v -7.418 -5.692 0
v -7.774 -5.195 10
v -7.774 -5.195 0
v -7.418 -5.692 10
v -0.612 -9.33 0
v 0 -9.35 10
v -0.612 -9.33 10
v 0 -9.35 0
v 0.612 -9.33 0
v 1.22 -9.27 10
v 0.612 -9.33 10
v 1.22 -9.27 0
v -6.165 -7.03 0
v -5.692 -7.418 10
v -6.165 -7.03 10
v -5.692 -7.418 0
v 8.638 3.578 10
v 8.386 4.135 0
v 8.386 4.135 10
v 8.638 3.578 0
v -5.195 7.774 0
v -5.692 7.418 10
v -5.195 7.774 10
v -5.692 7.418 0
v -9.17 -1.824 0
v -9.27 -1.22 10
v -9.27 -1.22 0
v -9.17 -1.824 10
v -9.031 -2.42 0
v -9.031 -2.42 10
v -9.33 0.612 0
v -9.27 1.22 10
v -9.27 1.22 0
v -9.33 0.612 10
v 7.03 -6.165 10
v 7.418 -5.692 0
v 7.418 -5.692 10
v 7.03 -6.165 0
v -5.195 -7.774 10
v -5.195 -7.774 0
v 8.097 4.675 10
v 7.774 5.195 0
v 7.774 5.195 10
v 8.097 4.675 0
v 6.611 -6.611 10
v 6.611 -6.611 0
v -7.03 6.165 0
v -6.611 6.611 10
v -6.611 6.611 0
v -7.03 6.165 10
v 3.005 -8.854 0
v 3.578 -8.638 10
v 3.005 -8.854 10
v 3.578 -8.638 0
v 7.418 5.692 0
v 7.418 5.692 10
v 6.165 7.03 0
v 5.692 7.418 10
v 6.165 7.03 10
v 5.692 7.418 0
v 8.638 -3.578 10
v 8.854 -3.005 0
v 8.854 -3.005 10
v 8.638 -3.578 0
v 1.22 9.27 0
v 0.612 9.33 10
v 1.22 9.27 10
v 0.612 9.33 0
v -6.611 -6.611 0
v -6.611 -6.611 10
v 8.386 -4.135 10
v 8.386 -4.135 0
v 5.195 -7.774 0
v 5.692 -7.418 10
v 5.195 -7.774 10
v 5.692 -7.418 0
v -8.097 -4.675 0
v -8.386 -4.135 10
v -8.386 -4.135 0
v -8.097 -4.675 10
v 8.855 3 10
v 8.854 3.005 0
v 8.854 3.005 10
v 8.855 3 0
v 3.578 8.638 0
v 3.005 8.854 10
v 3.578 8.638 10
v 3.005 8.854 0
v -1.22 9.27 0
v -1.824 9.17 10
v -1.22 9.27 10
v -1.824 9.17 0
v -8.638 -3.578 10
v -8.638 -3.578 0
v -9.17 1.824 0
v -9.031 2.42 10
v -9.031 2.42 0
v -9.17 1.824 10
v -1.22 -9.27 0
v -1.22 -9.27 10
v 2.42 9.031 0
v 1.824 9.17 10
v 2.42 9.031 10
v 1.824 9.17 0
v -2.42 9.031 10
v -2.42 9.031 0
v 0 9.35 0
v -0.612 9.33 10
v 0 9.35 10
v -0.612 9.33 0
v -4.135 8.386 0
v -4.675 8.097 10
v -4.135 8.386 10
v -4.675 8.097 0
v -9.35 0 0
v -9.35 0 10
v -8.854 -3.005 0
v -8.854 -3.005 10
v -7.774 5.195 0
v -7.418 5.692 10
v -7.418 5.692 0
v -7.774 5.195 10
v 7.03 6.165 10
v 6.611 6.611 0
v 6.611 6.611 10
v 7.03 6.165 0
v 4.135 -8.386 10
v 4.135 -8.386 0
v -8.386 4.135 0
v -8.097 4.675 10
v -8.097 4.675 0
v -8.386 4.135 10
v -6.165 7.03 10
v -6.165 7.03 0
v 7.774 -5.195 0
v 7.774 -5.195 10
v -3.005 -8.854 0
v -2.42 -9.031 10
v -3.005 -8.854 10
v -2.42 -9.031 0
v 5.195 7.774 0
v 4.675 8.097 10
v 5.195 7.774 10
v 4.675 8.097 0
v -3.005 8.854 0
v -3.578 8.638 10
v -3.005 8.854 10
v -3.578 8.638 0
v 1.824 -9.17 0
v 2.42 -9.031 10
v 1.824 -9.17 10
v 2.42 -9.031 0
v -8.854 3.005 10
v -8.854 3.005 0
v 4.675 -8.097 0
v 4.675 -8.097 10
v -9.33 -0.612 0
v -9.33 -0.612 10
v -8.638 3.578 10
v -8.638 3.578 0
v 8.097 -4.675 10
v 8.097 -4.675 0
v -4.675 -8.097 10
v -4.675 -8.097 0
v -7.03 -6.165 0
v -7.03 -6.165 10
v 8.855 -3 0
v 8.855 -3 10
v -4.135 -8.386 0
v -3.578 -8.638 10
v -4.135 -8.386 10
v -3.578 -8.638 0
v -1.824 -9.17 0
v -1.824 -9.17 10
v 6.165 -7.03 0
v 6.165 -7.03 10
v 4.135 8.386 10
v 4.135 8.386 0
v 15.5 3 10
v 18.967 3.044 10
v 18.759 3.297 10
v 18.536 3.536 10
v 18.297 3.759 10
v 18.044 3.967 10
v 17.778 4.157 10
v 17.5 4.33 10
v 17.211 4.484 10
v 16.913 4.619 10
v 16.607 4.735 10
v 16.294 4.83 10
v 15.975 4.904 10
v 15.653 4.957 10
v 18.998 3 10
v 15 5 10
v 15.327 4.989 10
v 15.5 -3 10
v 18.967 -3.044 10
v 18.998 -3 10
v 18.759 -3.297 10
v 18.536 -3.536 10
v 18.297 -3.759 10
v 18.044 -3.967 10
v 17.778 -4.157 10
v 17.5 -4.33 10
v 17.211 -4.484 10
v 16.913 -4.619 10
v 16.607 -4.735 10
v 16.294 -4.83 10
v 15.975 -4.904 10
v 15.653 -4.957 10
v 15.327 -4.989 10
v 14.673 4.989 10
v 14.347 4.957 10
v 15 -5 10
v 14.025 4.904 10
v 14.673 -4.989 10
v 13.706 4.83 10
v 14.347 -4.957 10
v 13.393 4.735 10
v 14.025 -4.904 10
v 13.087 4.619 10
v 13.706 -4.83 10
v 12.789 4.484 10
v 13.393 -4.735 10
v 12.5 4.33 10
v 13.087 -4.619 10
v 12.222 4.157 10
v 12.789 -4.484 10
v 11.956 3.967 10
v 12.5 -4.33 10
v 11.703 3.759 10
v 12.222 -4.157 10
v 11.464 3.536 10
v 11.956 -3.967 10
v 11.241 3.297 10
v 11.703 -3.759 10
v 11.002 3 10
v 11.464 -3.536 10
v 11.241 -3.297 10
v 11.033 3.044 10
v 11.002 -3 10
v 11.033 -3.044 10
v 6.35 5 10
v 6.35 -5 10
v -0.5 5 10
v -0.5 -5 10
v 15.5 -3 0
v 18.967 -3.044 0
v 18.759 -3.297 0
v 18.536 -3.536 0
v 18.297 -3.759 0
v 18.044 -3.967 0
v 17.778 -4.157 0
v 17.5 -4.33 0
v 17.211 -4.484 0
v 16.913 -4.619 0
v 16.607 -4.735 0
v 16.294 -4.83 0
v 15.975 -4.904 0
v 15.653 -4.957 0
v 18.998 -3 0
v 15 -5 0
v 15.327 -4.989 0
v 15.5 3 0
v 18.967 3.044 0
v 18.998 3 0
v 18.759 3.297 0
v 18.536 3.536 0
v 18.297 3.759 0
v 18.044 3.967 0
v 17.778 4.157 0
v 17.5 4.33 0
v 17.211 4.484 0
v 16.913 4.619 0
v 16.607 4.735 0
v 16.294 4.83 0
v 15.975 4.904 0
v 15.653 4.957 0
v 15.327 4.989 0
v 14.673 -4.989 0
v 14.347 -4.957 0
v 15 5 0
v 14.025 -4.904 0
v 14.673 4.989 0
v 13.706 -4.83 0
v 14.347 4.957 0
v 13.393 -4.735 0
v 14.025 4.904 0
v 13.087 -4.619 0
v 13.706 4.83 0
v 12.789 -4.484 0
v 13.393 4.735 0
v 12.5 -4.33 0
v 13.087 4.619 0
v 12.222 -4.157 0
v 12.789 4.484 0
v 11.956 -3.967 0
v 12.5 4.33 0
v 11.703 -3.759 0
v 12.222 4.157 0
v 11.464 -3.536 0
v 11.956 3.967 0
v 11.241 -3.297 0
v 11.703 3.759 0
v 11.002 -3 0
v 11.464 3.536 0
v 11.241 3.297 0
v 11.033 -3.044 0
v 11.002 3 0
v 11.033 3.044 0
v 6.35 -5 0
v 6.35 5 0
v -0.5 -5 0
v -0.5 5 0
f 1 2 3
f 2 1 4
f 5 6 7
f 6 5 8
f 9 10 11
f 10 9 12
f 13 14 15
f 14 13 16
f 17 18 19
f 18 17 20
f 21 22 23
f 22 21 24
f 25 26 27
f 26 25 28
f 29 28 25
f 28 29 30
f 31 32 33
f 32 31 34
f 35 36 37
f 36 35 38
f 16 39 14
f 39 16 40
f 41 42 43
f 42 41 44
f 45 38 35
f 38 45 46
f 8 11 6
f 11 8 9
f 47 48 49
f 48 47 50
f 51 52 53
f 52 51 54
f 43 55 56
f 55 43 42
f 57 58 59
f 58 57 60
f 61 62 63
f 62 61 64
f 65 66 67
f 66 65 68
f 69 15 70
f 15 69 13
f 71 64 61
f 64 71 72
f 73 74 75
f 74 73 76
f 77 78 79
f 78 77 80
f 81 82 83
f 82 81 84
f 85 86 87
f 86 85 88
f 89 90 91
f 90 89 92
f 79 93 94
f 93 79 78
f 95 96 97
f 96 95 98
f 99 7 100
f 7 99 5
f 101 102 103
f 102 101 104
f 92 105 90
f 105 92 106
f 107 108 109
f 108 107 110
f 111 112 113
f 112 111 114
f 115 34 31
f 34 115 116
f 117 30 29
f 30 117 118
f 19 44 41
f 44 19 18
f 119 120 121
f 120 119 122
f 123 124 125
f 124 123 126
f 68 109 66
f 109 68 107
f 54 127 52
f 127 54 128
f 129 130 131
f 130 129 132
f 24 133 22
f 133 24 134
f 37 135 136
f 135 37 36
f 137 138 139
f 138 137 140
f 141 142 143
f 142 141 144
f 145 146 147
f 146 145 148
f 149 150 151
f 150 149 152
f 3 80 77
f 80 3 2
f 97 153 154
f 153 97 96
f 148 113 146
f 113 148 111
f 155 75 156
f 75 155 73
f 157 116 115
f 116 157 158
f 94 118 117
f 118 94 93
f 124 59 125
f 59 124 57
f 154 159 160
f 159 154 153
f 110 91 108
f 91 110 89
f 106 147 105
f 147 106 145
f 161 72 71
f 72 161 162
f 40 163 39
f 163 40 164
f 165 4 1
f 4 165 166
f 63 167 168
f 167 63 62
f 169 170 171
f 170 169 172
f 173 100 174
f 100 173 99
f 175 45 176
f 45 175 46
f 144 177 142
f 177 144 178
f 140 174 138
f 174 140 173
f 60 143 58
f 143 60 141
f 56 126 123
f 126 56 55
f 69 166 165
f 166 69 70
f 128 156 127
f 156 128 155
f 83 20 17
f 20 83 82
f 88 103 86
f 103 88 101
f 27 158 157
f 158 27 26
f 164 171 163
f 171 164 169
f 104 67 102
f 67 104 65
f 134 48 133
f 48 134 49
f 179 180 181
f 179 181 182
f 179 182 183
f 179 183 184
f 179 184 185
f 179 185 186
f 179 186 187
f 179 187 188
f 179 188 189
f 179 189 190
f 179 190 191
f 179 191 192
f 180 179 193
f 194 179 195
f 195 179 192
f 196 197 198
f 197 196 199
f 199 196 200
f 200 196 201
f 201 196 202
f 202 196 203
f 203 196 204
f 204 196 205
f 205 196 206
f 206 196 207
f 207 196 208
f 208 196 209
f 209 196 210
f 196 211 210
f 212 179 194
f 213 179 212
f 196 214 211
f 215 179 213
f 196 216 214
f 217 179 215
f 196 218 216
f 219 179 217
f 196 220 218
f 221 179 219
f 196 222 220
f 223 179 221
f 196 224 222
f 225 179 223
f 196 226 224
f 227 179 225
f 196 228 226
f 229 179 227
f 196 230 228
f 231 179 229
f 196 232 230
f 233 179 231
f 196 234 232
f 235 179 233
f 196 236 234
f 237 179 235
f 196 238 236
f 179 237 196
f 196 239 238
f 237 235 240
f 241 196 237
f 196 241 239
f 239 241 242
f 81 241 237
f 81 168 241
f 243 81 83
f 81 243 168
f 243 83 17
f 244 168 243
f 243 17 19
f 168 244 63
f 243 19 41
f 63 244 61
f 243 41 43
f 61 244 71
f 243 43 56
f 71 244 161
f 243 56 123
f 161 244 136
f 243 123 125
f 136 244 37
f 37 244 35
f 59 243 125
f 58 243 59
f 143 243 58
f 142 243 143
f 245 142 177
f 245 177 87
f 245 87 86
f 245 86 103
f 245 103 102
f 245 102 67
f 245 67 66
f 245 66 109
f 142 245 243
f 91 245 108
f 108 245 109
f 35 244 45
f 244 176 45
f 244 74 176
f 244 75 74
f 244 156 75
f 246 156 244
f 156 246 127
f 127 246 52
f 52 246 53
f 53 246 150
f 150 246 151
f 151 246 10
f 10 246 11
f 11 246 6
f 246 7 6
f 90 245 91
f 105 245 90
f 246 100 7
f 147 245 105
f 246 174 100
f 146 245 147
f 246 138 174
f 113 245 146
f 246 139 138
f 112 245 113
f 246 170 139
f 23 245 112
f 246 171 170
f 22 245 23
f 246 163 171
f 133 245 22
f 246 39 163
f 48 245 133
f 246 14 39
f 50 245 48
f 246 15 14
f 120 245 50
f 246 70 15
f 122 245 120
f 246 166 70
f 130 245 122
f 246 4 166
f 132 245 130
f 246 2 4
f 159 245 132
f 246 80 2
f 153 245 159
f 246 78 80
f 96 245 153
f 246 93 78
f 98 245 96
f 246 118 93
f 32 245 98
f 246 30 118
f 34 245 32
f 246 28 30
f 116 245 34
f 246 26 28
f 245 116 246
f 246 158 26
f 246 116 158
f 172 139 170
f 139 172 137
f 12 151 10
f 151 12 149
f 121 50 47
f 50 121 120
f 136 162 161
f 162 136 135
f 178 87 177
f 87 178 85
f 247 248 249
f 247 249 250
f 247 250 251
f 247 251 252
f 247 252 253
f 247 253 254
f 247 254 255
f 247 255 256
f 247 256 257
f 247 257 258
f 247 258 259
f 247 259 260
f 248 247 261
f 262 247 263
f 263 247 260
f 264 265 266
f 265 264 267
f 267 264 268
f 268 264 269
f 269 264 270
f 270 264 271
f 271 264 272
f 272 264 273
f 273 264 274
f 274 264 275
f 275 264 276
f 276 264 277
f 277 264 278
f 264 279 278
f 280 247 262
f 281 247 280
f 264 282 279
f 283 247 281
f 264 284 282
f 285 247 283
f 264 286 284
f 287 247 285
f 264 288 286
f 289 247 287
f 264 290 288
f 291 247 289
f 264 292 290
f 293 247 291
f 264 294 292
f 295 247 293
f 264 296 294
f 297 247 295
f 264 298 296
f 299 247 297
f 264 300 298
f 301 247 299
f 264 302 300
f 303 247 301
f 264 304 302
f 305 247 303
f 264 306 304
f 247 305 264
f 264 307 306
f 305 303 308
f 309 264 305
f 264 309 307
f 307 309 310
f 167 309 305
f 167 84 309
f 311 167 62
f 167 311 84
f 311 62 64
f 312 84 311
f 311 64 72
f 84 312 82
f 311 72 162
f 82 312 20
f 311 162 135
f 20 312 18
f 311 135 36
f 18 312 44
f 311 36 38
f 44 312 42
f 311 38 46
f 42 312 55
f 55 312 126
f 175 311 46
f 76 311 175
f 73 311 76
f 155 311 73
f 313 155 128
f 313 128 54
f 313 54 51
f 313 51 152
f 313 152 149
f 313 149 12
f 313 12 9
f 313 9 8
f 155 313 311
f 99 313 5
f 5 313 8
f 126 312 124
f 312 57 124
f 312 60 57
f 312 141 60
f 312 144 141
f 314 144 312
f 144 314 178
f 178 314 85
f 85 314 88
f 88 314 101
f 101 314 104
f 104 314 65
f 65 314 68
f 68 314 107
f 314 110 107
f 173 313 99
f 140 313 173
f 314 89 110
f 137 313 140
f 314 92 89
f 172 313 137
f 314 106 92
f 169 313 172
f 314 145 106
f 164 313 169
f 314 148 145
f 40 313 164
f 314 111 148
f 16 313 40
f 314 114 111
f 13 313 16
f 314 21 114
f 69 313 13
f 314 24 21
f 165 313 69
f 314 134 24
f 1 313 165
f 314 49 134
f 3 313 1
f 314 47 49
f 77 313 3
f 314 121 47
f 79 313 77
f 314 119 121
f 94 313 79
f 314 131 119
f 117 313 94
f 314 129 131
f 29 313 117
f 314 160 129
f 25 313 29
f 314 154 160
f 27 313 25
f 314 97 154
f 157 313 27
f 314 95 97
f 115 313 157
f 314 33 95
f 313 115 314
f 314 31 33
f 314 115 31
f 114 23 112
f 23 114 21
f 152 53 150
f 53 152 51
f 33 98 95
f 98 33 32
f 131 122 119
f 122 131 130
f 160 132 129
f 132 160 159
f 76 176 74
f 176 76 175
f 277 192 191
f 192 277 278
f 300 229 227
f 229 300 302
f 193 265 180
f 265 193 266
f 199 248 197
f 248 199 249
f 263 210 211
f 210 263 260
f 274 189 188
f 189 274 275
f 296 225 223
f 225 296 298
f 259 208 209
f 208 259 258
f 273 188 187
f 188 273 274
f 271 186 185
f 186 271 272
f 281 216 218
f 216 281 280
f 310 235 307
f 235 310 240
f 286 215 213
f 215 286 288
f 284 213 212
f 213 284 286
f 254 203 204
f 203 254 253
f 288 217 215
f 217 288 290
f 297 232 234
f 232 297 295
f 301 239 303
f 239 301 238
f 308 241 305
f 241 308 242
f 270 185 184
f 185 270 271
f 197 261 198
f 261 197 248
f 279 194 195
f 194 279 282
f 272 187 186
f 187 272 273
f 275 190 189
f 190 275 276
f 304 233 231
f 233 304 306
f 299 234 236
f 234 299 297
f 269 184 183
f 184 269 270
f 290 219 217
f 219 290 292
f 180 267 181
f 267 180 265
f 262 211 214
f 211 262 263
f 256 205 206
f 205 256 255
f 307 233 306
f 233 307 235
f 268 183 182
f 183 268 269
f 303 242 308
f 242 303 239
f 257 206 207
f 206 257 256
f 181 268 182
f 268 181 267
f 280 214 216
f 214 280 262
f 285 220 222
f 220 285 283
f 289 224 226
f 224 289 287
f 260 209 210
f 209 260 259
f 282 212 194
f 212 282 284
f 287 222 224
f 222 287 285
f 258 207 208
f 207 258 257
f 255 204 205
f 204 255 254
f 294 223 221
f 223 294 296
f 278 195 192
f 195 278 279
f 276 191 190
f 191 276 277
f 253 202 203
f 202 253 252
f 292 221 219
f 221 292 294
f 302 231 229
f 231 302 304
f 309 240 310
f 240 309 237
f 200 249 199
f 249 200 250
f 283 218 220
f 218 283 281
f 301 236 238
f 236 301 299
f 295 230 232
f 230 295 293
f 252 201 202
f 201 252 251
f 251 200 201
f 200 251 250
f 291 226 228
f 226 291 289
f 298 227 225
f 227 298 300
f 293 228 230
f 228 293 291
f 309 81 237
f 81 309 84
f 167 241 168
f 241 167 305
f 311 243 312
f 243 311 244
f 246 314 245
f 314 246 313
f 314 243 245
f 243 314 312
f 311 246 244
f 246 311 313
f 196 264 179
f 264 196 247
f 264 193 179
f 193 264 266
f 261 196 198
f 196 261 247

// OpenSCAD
// Snap-on tubing clip for 12.7 mm stand rod
// Print orientation: flat on bed, extrusion in +Z

$fn = 96;

// --- Rod ring ---
rod_d      = 12.7;   // rod diameter
ring_w     = 3;      // ring wall thickness
ring_od    = rod_d + 2*ring_w;  // outer diameter (18.7)
ring_id    = rod_d;   // inner diameter (12.7)
ring_x     = 0;      // ring centre X
opening    = 10;     // opening width on -X side

// --- Tubing ring ---
tube_d     = 6;      // tubing inner diameter
tube_w     = 2;      // tubing wall thickness
tube_od    = tube_d + 2*tube_w;  // tubing outer diameter (10)
tube_x     = 15;     // tubing ring centre X

// --- Bridge ---
bridge_w   = 6;      // bridge width (Y)
bridge_x0  = 8;      // bridge start X
bridge_x1  = 12;     // bridge end X

// --- Cut clearance ---
eps        = 0.5;    // extension of cutting shapes past faces

difference() {
    union() {
        // Rod ring
        translate([ring_x, 0, 0])
            cylinder(d = ring_od, h = 10);

        // Tubing ring
        translate([tube_x, 0, 0])
            cylinder(d = tube_od, h = 10);

        // Bridge
        translate([bridge_x0, -bridge_w/2, 0])
            cube([bridge_x1 - bridge_x0, bridge_w, 10]);
    }

    // Rod ring opening on -X side
    translate([ring_x - eps, -opening/2, 0])
        cube([ring_id/2 + eps, opening, 10]);

    // Tubing ring opening on +X side
    translate([tube_x + eps, -tube_d/2, 0])
        cube([tube_od/2 + eps, tube_d, 10]);
}
